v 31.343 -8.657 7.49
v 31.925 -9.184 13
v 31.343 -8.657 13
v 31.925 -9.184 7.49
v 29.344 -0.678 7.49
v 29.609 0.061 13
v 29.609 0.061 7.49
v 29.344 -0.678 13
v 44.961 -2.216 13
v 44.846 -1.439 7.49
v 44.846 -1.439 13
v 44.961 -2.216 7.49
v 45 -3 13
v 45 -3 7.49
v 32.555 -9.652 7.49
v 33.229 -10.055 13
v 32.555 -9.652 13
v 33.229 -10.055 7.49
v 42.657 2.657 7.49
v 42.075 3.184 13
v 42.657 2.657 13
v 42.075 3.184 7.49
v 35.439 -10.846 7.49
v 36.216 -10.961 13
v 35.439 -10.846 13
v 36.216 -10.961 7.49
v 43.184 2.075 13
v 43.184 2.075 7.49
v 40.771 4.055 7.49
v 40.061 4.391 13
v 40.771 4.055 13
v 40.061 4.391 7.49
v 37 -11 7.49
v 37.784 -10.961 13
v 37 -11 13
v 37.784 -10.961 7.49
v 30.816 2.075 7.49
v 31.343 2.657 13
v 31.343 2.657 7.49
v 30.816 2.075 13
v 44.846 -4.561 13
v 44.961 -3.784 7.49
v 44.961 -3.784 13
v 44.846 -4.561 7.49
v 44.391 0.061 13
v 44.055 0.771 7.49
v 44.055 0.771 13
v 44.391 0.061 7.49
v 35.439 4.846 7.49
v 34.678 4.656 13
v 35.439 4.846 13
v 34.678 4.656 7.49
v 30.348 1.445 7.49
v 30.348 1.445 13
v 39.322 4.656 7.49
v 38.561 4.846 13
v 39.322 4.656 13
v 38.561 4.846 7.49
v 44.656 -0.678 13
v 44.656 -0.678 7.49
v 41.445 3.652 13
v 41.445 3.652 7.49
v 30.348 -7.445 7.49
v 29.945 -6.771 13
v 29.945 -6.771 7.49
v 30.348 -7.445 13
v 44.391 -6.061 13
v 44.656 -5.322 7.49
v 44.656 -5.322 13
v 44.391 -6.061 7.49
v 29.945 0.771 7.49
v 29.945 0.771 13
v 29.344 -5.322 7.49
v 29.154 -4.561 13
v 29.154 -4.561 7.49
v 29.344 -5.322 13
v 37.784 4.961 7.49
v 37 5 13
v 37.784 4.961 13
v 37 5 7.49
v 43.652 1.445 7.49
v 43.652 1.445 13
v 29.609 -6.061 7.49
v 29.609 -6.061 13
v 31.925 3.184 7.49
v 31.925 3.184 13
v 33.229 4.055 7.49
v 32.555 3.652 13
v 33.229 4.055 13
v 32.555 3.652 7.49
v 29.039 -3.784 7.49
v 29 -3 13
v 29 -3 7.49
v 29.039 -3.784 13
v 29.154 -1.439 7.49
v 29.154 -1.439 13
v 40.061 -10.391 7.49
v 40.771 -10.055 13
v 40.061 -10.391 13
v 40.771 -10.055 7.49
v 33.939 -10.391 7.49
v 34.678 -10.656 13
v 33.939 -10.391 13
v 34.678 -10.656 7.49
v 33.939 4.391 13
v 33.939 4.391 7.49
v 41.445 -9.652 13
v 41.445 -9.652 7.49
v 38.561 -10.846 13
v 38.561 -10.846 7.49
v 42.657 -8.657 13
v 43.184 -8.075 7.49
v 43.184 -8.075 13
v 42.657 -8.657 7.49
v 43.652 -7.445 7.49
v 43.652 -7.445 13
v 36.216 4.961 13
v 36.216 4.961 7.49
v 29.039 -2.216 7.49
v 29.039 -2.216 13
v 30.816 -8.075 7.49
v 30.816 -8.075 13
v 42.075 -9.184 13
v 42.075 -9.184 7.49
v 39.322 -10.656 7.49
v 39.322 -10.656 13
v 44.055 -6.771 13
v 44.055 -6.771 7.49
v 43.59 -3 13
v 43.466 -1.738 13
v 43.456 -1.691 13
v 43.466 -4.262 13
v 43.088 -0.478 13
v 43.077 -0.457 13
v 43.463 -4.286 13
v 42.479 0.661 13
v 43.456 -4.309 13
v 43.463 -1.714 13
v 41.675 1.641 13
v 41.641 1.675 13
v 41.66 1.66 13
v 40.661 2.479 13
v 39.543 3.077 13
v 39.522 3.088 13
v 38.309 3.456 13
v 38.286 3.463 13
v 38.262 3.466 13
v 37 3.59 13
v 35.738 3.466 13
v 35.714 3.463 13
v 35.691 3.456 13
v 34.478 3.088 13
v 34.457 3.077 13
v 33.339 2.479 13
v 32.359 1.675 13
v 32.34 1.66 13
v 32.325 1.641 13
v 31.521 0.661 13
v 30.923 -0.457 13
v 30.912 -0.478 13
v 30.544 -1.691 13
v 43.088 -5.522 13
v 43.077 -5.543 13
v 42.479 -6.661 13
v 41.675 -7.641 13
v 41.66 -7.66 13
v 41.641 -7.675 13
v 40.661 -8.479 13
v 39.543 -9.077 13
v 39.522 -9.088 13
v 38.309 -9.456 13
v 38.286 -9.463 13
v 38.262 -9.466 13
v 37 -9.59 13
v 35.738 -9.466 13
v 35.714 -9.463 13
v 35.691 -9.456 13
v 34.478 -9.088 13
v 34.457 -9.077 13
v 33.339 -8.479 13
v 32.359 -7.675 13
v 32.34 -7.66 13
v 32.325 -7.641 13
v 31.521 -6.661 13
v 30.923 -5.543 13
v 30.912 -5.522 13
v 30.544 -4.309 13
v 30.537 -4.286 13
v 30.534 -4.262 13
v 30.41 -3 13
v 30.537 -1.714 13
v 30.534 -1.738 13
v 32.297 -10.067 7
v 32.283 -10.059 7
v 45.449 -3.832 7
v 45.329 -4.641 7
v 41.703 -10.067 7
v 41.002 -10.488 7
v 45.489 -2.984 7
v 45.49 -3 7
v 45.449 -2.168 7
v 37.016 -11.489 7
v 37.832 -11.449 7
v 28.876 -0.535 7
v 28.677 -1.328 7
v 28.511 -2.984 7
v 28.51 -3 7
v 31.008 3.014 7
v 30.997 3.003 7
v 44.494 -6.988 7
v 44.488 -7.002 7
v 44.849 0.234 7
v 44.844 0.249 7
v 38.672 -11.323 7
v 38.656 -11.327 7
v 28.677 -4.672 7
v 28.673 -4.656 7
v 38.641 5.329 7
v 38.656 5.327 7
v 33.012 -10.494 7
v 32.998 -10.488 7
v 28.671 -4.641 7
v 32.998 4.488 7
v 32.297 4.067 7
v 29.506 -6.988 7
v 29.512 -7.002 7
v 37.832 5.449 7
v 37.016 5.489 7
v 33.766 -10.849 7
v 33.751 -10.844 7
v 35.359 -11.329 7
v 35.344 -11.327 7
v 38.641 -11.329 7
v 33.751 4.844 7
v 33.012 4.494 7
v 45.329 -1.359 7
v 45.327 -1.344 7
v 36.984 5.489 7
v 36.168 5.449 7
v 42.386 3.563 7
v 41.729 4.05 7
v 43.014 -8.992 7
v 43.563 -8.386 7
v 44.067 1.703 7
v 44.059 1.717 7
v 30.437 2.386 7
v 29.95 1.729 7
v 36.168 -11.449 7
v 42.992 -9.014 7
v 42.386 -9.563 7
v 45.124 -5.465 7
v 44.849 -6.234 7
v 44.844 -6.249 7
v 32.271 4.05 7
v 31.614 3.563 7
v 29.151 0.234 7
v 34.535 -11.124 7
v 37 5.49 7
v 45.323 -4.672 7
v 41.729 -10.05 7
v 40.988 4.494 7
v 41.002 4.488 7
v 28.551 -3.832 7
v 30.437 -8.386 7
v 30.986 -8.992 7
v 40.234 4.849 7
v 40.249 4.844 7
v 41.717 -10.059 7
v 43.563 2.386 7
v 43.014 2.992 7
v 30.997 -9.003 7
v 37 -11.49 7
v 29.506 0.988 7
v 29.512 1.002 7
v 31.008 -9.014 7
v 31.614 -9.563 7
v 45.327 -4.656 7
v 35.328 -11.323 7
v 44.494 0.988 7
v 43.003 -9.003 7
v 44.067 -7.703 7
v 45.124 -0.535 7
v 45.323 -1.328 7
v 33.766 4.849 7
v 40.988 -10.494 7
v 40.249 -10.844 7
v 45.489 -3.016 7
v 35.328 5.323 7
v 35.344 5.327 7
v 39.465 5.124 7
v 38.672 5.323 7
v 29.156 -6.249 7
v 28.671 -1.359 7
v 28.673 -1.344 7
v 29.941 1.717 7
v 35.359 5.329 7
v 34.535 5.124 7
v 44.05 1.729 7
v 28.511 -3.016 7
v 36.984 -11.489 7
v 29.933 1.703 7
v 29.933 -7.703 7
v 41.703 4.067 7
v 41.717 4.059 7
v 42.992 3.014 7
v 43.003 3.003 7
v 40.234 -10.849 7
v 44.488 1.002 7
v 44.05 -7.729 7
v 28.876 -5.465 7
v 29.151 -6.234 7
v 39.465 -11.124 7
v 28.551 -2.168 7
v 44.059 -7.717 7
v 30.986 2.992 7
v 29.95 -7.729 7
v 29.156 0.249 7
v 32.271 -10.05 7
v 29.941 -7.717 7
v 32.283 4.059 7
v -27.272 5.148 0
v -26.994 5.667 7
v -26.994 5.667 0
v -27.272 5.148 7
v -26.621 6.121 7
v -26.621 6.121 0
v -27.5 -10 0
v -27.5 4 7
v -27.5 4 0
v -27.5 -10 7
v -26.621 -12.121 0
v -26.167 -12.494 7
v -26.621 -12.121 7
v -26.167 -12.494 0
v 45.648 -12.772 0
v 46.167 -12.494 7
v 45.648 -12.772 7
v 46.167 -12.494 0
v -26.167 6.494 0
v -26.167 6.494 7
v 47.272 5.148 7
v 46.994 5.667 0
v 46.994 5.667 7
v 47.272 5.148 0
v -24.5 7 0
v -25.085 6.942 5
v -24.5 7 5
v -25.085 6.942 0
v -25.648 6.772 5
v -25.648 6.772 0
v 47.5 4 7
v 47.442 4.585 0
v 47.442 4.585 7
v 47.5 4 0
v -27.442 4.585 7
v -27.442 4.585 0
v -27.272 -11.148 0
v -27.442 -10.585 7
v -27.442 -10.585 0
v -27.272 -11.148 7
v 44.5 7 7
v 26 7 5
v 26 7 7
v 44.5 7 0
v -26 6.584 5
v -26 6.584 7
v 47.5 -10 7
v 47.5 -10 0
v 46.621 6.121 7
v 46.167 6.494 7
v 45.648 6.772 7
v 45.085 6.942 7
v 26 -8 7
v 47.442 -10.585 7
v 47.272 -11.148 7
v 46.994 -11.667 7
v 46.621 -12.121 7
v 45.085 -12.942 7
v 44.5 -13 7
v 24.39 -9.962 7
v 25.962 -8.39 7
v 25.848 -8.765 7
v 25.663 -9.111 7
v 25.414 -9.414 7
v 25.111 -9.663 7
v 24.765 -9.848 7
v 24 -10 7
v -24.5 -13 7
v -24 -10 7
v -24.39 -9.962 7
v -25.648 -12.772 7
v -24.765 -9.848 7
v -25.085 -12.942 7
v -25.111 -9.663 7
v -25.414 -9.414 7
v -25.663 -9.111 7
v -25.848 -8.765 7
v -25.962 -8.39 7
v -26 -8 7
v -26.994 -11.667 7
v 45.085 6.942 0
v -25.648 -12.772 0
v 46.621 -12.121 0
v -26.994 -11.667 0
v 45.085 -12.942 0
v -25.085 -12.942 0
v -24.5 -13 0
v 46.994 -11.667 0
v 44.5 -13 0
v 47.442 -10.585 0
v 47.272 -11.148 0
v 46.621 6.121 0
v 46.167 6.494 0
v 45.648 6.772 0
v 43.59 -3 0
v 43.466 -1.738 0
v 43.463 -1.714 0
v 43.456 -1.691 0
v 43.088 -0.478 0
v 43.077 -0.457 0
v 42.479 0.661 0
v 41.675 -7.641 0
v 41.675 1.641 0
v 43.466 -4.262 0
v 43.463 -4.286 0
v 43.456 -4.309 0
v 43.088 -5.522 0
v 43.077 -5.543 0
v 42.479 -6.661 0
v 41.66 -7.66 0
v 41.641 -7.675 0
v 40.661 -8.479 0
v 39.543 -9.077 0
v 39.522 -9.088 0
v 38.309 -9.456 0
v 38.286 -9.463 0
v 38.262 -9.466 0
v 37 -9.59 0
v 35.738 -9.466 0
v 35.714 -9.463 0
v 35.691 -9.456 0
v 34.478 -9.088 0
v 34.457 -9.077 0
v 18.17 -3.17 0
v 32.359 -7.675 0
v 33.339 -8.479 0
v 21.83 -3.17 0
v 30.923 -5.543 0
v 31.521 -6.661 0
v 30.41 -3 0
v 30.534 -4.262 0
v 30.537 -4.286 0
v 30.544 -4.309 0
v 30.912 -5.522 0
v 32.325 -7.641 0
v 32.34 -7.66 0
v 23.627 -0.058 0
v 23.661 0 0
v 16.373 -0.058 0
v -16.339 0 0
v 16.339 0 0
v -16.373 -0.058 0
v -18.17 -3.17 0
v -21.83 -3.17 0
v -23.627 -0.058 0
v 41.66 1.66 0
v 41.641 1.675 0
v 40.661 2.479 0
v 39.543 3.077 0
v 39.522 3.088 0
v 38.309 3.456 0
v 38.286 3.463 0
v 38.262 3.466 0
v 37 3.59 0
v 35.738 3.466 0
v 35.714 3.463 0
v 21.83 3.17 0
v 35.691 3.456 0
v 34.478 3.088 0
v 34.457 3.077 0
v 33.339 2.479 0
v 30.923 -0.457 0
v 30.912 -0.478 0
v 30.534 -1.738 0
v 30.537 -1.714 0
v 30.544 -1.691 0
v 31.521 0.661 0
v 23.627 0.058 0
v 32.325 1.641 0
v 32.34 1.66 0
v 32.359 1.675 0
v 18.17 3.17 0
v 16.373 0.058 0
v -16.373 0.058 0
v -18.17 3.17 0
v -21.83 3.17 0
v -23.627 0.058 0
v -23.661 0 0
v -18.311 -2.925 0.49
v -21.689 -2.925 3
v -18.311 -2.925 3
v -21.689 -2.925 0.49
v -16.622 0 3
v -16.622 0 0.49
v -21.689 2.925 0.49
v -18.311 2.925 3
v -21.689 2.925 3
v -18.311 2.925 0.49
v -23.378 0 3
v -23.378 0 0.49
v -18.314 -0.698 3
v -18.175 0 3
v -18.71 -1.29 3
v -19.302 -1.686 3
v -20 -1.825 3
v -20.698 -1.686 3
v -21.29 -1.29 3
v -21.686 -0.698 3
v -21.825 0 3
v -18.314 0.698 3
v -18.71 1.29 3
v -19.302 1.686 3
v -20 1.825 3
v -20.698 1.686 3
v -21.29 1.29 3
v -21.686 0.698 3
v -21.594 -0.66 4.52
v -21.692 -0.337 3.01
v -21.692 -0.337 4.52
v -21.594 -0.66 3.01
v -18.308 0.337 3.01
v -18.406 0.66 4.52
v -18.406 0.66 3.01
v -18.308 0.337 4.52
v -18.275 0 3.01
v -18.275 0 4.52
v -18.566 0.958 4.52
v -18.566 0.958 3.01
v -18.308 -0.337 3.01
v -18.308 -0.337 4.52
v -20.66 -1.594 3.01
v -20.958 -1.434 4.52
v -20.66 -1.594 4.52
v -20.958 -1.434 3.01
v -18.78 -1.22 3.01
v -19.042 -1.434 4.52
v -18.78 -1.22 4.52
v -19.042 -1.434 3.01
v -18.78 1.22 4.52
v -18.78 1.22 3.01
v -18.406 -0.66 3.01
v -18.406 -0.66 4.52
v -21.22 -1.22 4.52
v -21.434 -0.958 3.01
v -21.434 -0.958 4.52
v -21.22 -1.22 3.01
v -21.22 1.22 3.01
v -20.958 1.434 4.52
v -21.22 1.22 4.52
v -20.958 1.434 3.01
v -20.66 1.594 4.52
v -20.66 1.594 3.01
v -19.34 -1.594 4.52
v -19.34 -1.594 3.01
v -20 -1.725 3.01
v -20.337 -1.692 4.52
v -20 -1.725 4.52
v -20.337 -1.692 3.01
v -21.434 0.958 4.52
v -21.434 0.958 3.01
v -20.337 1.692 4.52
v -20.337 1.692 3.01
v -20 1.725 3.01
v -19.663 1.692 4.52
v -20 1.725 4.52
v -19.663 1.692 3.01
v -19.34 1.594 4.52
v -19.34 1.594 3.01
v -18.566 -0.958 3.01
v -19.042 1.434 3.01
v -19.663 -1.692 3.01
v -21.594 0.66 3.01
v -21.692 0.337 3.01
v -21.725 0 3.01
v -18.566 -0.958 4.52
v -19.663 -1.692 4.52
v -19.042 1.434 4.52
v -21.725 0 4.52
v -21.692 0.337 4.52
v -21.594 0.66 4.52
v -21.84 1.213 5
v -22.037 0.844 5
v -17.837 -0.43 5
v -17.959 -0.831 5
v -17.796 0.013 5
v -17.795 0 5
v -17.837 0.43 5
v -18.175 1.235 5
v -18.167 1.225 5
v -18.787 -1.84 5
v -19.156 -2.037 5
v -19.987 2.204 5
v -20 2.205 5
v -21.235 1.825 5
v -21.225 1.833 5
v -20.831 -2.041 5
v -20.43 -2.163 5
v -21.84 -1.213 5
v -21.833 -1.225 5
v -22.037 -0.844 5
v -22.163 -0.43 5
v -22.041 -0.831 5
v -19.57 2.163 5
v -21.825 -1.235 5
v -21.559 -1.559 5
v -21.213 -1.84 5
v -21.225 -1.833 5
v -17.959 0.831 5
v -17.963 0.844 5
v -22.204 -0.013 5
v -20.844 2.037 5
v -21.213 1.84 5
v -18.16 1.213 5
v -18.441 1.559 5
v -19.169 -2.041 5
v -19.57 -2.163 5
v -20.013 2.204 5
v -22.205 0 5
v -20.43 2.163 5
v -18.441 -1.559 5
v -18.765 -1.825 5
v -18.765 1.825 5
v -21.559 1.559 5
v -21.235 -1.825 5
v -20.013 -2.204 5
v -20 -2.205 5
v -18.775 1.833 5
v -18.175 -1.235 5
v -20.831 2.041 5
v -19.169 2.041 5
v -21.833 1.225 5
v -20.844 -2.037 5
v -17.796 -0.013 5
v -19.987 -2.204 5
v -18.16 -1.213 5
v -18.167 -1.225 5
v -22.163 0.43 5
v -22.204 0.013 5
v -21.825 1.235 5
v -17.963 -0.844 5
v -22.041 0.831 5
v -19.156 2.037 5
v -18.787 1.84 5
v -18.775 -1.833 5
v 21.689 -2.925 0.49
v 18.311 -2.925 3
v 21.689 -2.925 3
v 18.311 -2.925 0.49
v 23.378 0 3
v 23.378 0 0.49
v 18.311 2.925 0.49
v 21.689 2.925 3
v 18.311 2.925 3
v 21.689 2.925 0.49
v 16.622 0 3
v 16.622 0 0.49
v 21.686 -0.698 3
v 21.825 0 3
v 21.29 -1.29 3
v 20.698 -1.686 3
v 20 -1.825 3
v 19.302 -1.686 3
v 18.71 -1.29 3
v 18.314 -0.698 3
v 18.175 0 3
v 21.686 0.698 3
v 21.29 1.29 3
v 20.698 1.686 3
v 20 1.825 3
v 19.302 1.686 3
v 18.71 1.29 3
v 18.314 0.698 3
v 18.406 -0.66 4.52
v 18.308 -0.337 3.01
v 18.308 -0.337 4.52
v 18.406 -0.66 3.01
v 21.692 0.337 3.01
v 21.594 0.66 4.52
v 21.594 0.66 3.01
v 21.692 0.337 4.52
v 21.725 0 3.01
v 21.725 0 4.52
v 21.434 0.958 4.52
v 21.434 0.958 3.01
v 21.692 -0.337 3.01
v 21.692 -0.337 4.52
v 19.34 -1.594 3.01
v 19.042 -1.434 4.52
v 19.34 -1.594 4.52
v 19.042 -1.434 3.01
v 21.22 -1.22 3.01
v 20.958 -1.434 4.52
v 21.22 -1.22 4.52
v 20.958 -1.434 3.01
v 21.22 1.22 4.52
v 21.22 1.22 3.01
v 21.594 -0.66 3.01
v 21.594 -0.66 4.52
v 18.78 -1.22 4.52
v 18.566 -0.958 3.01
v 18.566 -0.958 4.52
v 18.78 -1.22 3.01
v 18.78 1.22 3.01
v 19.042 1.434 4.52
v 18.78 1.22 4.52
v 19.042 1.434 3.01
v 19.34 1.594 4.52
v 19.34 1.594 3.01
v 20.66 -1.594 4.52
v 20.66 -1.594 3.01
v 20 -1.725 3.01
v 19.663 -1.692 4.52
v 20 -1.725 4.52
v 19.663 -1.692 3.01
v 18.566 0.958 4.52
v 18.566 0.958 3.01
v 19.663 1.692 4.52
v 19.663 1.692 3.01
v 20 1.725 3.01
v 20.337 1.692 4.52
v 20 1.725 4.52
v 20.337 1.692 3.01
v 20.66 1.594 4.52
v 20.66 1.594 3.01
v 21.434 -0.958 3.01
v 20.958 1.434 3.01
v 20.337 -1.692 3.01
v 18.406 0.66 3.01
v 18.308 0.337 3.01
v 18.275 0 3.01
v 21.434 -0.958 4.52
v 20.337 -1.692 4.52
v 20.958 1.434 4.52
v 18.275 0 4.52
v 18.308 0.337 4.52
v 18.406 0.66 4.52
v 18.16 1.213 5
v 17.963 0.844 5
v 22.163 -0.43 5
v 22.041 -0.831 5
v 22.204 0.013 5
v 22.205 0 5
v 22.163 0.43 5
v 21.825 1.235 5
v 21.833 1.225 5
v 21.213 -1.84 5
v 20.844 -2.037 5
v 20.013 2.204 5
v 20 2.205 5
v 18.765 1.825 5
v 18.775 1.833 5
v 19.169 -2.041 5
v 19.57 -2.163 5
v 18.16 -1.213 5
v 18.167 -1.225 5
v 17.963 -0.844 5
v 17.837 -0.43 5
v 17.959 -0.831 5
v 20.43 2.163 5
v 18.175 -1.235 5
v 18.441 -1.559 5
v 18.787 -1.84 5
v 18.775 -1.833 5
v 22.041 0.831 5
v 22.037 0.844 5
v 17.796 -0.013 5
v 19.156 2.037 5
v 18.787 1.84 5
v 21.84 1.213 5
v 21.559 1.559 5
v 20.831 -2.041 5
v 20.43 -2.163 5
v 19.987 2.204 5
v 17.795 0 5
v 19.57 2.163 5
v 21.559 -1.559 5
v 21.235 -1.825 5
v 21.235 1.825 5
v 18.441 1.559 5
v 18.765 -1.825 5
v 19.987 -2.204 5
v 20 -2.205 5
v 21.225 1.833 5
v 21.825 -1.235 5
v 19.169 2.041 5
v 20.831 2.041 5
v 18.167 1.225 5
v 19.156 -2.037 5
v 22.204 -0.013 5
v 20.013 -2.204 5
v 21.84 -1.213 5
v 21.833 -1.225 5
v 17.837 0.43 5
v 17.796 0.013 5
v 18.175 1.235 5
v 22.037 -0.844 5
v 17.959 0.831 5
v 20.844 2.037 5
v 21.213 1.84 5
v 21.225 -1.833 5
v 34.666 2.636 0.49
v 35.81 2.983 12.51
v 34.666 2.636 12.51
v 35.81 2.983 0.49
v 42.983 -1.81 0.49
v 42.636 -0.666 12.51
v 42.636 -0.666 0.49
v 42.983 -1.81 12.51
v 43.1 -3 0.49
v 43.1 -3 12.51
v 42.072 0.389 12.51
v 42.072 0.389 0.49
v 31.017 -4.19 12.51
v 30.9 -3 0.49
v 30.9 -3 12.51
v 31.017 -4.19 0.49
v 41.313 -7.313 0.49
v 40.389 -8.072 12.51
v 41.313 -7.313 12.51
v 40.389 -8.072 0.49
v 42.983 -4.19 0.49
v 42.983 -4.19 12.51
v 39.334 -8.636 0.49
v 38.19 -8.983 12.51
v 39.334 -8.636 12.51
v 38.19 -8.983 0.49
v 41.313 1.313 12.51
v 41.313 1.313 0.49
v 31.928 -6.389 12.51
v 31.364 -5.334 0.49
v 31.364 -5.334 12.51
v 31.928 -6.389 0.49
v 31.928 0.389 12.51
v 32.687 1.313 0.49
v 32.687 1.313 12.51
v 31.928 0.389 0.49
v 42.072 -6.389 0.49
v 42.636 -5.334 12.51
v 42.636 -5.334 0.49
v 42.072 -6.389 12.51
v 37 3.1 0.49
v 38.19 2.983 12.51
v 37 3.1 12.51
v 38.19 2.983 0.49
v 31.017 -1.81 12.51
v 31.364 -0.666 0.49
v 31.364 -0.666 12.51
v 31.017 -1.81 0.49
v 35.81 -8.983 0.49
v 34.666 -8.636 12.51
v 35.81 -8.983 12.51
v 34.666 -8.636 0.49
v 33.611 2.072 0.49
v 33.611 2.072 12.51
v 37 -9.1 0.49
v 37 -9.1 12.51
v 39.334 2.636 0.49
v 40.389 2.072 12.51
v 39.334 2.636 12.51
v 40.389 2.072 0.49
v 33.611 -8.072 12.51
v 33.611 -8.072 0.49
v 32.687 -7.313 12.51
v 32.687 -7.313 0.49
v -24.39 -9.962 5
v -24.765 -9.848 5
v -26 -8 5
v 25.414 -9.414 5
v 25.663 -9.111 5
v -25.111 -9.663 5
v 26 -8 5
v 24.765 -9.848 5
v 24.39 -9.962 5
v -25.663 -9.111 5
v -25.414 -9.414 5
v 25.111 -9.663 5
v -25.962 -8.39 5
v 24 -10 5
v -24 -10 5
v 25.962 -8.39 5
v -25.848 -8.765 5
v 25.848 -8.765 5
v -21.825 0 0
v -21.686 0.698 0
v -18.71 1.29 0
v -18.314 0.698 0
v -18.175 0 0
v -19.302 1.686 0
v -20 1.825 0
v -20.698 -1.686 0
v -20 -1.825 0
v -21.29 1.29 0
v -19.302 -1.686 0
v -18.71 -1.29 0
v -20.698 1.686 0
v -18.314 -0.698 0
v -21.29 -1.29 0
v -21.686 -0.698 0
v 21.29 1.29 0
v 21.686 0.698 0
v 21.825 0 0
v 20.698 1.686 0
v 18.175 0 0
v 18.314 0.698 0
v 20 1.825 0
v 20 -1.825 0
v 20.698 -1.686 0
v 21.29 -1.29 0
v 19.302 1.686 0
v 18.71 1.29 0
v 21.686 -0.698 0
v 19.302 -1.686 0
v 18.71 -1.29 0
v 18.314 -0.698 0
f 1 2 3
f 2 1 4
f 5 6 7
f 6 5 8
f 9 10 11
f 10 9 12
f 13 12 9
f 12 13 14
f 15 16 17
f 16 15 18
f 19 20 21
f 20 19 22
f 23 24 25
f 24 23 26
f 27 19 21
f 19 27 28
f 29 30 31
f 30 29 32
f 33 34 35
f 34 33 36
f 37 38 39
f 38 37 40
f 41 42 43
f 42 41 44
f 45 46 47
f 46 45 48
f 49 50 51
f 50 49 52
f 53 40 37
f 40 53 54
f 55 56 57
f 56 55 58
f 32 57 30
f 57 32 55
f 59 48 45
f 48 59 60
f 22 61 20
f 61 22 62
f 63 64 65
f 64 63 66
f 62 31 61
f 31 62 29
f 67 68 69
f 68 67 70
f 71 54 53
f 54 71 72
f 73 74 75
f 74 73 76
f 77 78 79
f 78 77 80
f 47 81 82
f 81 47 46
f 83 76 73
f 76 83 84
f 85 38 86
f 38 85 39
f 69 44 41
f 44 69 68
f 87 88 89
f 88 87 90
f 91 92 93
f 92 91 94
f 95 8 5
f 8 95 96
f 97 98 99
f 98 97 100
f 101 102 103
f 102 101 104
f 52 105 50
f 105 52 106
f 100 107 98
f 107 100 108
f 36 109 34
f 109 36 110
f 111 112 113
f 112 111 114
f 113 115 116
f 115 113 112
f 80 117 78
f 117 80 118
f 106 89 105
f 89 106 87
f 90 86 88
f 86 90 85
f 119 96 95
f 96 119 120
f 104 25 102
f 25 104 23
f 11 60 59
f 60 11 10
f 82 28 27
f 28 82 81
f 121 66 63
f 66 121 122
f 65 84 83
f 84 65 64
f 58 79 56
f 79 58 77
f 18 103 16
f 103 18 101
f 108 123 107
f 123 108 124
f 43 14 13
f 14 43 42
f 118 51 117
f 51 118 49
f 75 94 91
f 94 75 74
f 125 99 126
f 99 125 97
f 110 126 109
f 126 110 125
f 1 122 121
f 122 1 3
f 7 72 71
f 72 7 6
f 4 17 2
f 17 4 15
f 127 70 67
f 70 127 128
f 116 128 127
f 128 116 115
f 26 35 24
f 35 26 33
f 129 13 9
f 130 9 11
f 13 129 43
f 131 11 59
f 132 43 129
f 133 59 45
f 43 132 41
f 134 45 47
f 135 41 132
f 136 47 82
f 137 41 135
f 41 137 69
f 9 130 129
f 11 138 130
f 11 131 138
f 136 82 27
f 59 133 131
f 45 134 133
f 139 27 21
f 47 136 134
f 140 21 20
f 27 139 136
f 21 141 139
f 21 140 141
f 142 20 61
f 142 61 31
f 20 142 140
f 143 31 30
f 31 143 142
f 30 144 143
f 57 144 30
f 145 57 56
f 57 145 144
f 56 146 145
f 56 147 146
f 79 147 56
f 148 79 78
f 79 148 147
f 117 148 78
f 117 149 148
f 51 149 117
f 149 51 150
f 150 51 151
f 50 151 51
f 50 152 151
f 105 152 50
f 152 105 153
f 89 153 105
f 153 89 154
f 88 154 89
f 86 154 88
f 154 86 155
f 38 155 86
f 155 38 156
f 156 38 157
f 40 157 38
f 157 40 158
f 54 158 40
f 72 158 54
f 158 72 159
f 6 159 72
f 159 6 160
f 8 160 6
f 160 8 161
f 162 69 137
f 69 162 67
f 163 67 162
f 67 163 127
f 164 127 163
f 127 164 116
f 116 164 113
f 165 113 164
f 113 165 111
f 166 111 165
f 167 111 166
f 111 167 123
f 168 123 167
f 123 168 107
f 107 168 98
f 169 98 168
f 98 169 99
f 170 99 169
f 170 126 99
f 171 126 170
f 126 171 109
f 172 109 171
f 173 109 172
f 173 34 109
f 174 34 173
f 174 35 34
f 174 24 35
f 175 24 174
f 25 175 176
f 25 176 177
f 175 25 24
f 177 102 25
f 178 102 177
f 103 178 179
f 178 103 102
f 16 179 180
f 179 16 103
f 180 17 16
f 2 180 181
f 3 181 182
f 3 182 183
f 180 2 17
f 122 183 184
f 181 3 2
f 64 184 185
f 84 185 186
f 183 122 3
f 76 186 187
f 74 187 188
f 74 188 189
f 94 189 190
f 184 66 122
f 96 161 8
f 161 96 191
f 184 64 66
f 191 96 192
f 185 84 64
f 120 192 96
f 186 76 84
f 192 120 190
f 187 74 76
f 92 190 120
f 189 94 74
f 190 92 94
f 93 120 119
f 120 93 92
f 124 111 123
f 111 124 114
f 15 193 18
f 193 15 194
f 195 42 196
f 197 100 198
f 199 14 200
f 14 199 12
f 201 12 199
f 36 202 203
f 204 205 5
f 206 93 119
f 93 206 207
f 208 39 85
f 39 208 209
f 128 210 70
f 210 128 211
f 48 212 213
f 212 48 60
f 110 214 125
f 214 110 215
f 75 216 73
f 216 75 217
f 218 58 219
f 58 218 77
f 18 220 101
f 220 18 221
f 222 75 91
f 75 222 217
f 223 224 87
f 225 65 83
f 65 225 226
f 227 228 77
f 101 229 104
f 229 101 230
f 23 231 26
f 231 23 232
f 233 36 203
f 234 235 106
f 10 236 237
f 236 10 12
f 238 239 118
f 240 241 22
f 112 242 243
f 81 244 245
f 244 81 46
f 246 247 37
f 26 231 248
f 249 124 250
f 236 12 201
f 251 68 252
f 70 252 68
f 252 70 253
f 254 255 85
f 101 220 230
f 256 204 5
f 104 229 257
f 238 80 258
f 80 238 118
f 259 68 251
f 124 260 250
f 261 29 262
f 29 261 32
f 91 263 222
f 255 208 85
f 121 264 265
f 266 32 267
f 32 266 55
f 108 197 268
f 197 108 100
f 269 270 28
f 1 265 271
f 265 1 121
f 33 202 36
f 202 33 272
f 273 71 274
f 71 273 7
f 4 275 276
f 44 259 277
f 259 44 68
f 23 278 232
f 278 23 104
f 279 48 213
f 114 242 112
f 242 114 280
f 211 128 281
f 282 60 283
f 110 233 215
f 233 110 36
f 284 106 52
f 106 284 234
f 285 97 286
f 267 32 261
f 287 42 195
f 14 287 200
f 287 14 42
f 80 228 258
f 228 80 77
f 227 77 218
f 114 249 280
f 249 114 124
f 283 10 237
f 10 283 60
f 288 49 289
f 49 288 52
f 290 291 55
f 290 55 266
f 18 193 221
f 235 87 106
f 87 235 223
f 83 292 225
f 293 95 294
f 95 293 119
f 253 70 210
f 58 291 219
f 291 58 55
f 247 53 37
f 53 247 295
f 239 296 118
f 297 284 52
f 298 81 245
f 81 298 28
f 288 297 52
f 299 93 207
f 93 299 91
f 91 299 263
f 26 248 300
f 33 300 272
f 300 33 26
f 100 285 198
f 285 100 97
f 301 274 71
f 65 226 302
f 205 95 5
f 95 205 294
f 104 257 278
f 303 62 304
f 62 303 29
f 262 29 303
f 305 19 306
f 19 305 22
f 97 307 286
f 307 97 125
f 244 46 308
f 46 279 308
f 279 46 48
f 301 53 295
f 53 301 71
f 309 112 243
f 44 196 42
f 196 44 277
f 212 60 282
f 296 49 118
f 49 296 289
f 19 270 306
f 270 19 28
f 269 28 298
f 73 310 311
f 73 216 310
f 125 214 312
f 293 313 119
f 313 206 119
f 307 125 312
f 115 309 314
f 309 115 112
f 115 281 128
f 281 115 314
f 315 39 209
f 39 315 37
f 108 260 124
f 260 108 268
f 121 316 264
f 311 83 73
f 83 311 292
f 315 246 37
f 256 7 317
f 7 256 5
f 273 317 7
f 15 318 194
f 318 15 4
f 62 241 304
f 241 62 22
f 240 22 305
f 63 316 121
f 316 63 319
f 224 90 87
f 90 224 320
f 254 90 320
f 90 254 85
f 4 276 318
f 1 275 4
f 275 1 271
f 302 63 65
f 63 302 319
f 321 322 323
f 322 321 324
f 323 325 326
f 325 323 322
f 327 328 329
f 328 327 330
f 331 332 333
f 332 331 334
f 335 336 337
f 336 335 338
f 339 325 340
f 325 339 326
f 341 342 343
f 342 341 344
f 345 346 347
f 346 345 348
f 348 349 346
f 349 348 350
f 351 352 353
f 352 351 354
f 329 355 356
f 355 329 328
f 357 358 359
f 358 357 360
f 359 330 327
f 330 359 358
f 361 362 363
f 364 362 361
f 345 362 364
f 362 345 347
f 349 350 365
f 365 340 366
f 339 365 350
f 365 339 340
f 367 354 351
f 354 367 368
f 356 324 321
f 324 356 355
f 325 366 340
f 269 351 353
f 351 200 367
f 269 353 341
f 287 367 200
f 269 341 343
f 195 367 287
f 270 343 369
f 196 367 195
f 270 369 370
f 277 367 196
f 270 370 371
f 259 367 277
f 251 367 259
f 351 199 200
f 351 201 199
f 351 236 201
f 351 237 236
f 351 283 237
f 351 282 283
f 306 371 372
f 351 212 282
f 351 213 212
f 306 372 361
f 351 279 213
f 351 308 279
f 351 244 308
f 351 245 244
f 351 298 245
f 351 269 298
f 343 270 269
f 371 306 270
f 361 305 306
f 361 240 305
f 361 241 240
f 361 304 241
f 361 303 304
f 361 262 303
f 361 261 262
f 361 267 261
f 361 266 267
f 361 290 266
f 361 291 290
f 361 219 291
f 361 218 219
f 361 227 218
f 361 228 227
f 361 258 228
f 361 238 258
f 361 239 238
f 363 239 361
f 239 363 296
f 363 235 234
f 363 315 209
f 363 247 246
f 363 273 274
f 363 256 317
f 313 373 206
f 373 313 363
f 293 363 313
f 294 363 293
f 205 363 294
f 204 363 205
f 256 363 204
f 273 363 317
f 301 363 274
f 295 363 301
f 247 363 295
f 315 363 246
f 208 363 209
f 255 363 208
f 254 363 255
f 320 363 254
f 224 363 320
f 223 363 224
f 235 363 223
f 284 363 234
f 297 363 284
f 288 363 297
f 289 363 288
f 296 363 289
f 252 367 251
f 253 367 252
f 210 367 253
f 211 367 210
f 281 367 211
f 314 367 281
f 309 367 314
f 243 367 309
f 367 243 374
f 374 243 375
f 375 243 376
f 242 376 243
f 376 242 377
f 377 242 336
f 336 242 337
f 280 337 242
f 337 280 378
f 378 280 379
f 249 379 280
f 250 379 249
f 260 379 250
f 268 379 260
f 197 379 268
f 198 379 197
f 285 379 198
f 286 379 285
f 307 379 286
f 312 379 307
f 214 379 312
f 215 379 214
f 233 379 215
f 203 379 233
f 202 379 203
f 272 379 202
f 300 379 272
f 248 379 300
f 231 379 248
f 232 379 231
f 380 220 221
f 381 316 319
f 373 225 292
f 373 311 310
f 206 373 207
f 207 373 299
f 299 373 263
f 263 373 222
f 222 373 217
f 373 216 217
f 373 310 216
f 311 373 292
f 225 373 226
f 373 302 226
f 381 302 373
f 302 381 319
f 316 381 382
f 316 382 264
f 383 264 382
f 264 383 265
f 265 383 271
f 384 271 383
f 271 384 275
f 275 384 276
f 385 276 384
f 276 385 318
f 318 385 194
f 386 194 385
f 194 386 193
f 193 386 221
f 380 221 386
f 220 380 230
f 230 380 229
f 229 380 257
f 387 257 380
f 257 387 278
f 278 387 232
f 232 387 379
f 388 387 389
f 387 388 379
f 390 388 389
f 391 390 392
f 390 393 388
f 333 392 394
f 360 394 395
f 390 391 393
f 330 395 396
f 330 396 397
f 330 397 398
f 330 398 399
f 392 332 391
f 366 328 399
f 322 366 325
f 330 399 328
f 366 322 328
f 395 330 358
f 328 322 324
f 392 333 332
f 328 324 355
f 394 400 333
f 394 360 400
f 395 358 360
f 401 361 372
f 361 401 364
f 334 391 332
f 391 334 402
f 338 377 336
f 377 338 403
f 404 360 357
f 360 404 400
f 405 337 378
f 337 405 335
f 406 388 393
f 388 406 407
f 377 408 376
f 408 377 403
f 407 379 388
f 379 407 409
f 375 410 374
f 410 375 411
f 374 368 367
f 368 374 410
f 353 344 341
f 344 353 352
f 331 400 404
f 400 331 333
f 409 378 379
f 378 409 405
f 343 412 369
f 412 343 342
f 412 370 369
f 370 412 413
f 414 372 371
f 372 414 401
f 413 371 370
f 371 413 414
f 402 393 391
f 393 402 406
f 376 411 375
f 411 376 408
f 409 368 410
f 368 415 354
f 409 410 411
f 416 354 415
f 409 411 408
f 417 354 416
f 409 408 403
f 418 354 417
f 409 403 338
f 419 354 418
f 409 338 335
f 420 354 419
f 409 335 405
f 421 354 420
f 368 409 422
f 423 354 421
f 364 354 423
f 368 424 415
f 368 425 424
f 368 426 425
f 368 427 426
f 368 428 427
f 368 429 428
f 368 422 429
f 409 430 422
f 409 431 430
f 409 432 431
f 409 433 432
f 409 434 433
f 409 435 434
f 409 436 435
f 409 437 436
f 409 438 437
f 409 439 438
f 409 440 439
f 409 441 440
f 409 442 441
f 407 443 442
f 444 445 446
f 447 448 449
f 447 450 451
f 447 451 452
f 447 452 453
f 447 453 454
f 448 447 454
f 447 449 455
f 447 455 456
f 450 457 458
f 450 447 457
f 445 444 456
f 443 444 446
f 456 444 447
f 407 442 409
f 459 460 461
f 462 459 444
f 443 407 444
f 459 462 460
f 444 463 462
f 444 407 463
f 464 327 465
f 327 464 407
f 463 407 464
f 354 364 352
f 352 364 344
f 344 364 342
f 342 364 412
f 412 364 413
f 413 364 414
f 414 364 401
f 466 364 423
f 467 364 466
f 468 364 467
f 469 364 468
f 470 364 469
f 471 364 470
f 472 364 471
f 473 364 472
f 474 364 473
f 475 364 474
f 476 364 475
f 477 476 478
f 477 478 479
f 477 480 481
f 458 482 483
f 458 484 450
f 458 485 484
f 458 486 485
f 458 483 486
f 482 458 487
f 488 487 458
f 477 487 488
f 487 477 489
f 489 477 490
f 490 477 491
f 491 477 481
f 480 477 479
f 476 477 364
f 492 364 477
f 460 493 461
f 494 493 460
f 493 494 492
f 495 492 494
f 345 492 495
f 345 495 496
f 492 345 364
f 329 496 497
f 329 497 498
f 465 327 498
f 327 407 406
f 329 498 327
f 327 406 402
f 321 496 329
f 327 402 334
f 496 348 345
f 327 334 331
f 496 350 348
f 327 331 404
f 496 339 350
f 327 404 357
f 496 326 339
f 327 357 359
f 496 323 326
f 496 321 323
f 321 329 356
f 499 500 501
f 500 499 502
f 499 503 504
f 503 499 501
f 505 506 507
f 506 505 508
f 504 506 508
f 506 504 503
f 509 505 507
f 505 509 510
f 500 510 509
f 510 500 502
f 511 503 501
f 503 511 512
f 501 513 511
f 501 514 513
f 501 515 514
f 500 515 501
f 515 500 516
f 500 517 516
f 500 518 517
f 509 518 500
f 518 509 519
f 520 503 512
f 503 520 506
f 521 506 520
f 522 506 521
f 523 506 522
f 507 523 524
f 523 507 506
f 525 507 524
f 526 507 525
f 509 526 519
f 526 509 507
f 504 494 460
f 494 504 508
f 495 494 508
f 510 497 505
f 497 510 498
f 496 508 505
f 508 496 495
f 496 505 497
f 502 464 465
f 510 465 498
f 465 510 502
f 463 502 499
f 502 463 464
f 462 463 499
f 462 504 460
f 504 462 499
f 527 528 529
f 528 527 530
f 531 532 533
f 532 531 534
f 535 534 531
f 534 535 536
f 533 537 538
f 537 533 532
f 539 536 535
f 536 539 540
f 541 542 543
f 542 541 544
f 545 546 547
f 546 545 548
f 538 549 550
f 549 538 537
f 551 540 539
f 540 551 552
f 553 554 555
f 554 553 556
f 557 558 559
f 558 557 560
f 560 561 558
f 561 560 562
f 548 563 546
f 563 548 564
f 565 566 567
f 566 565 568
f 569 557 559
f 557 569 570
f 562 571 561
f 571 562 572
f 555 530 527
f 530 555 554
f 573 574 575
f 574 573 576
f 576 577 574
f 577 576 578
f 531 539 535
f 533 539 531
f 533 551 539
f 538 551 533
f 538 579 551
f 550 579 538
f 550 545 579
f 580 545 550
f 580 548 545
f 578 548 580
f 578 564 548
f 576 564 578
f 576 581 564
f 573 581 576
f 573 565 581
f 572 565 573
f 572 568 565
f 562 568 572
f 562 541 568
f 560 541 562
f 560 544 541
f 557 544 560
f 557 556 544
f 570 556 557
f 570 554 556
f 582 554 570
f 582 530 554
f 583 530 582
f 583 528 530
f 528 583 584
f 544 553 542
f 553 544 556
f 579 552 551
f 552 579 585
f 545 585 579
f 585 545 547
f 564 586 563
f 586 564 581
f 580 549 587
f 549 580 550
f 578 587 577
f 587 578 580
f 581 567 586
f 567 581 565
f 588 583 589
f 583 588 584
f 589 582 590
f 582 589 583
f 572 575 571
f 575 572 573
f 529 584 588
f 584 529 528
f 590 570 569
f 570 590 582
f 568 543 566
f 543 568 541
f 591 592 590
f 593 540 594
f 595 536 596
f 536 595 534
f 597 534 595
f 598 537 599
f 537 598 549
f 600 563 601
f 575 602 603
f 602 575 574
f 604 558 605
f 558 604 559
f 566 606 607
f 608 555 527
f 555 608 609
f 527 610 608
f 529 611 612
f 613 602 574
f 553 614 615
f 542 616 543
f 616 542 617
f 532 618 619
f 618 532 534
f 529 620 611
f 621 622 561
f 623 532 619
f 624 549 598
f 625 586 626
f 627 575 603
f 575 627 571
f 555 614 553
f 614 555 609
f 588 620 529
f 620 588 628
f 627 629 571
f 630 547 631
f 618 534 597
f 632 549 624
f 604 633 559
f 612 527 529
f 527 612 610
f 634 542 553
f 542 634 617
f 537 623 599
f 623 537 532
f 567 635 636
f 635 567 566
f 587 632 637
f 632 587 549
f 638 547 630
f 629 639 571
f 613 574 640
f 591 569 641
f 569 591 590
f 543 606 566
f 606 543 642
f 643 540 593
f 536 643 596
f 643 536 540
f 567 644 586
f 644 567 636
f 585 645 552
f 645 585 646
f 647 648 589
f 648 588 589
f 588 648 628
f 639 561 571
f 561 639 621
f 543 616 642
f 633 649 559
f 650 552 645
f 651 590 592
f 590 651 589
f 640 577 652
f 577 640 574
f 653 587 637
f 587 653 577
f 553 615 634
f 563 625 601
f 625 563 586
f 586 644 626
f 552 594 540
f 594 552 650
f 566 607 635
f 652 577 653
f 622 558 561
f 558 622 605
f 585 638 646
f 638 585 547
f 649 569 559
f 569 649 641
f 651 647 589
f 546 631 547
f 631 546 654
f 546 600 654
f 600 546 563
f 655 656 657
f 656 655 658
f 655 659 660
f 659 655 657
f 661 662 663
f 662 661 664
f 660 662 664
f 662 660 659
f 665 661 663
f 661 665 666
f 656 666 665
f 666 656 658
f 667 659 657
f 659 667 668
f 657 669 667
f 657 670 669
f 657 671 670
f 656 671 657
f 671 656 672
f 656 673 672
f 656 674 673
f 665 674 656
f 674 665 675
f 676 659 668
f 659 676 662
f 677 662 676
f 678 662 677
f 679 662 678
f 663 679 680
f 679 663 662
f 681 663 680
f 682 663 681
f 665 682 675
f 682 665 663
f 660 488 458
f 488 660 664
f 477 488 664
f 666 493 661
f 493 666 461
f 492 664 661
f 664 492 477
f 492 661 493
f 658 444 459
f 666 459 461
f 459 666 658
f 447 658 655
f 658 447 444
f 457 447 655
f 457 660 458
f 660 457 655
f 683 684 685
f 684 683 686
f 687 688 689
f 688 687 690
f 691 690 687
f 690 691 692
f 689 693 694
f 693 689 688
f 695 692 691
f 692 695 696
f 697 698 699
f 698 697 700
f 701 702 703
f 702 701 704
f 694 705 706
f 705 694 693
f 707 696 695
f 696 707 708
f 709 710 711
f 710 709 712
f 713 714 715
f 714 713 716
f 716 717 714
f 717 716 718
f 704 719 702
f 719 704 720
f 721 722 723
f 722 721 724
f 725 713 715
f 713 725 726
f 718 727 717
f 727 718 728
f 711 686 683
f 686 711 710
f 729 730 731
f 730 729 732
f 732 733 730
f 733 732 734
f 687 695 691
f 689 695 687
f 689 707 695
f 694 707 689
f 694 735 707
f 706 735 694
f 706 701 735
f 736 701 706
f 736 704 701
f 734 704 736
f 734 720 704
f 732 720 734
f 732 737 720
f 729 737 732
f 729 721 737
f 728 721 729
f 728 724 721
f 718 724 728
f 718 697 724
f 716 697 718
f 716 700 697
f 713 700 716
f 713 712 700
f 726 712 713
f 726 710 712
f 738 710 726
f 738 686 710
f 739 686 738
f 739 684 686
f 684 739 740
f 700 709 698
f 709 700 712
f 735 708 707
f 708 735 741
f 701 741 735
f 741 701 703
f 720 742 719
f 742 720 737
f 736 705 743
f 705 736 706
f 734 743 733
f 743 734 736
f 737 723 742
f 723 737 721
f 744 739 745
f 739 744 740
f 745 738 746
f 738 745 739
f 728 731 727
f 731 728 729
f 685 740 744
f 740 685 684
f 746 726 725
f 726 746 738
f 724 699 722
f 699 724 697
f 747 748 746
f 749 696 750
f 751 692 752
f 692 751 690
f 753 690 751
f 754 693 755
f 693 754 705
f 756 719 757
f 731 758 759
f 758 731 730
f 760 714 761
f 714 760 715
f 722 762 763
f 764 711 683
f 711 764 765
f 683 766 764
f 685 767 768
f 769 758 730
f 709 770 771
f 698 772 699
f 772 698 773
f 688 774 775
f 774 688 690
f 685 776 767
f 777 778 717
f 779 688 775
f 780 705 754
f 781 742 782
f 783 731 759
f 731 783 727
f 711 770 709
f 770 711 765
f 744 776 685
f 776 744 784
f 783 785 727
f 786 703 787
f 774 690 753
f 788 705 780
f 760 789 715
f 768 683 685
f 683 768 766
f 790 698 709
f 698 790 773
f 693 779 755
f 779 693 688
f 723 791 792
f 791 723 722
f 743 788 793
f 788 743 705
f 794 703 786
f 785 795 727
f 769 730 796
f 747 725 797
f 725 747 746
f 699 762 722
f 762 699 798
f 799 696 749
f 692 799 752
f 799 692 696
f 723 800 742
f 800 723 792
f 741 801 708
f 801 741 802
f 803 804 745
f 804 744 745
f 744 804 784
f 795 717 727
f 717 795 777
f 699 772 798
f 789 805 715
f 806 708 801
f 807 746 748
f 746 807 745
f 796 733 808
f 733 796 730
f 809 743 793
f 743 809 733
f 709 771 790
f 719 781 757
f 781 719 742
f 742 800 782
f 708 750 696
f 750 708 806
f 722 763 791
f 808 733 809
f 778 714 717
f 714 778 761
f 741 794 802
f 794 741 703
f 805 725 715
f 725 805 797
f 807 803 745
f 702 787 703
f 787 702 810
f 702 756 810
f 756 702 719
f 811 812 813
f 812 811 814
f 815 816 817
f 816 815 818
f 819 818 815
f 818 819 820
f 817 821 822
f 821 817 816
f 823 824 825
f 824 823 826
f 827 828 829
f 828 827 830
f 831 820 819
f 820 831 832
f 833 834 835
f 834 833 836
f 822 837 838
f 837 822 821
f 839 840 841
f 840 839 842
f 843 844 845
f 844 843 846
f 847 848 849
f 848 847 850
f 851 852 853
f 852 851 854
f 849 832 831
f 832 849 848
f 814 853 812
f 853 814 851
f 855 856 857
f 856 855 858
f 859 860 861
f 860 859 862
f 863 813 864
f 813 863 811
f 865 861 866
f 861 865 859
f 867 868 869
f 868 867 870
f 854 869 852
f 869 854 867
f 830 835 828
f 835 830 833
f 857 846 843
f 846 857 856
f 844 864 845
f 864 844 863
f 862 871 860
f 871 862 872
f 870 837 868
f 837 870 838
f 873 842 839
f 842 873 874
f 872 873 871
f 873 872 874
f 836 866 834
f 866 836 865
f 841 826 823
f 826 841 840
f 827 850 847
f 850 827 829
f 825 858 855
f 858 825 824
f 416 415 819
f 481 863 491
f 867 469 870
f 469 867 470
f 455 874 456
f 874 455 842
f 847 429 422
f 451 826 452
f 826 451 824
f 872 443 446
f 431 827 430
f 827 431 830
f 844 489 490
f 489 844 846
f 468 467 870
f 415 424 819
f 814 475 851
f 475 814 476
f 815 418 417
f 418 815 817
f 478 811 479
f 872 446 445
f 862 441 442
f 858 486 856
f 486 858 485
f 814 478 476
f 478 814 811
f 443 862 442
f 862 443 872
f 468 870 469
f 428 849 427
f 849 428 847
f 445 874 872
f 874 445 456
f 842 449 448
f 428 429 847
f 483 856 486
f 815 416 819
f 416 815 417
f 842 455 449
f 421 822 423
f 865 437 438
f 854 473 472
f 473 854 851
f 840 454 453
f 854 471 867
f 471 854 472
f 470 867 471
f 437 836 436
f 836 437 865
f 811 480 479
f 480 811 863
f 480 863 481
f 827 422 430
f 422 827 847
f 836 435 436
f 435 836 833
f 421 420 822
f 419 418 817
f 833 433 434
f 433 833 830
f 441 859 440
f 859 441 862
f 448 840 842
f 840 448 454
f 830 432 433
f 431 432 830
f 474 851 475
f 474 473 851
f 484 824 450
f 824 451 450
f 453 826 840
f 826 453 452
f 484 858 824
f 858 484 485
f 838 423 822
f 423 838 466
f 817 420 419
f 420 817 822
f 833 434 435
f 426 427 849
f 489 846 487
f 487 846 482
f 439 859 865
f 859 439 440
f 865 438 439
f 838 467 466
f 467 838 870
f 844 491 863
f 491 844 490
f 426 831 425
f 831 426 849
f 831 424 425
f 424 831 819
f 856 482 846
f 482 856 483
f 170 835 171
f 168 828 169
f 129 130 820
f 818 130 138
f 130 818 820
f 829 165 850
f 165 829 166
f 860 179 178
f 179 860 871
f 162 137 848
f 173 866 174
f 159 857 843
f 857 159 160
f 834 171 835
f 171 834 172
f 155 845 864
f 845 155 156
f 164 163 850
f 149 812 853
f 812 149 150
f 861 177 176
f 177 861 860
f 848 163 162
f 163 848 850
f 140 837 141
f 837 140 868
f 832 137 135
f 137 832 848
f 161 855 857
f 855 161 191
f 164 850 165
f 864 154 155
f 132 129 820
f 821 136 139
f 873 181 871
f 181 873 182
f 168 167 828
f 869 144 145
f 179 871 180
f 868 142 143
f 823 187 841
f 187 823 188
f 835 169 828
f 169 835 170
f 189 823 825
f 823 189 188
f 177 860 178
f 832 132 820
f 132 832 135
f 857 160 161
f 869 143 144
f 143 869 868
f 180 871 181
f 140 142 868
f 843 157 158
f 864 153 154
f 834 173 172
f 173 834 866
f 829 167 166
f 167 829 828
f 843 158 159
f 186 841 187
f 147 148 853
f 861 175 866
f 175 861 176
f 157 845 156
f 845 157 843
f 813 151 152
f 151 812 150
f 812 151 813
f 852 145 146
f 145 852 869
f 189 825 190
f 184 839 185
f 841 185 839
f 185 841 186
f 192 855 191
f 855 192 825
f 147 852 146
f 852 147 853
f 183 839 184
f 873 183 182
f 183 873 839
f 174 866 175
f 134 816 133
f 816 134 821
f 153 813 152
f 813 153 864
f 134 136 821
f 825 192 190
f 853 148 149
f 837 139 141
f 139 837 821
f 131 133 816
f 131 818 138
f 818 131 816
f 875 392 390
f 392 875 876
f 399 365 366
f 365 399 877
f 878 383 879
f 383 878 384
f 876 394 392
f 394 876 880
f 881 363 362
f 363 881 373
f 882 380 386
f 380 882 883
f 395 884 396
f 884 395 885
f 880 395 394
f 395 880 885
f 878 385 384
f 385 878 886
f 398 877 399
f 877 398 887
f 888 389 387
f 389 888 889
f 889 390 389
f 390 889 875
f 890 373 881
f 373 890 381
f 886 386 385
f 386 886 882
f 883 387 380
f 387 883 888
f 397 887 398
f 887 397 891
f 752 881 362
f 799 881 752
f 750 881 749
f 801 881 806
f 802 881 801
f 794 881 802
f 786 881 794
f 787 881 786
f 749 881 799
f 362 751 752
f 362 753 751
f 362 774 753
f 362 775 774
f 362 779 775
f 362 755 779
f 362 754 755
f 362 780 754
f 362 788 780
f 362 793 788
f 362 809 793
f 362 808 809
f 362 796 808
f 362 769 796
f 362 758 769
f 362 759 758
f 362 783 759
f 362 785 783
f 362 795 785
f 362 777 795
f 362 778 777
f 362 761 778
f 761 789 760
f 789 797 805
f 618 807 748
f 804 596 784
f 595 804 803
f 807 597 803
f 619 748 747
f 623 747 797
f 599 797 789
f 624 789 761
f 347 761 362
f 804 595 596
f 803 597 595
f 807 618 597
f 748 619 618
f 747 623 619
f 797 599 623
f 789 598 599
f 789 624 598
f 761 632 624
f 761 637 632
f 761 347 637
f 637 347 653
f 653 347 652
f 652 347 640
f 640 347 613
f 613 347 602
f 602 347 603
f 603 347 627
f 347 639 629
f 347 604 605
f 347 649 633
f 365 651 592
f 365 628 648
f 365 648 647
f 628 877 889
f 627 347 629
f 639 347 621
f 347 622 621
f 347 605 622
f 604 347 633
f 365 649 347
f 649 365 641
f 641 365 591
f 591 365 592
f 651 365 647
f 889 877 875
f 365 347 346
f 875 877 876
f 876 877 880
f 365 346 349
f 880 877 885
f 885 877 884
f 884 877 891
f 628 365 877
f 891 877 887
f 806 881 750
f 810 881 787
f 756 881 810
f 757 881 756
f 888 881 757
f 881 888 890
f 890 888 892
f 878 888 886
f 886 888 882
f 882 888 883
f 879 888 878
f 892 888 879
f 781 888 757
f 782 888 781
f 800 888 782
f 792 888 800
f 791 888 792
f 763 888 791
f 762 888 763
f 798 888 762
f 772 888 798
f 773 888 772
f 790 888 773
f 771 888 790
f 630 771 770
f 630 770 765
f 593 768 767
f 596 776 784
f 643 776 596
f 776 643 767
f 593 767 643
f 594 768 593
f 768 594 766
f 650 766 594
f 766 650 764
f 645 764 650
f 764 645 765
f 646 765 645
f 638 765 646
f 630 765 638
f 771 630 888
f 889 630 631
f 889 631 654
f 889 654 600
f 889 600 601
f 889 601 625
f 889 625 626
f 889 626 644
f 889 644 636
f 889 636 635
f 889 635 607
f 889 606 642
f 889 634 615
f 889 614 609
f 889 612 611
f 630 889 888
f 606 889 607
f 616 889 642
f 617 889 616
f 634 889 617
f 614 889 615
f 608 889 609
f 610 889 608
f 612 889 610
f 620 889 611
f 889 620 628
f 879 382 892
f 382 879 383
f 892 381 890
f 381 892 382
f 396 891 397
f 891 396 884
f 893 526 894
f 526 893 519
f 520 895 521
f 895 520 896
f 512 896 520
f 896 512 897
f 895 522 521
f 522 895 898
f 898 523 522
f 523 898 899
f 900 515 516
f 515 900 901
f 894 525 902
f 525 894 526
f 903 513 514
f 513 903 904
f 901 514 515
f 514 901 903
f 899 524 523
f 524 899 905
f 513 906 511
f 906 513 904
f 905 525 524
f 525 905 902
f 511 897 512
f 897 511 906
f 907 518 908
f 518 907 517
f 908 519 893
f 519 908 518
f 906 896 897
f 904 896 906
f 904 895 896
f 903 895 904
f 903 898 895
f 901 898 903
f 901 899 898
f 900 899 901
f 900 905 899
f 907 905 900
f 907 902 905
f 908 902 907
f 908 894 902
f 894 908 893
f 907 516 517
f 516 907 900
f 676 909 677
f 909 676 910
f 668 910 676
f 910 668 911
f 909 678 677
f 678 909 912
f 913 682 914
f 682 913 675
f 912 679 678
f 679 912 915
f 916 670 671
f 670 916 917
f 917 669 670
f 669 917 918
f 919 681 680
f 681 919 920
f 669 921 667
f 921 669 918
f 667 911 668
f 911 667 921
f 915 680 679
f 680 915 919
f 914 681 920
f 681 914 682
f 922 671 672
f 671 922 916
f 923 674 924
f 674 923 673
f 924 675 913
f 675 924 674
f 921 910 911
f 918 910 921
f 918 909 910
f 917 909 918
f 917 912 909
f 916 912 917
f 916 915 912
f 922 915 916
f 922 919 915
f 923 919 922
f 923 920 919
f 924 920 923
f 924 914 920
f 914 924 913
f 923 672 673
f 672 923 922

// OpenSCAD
// enlarged to account for shrink
g3mm = 3.45;
g3mmnut = 5.85;
g2mm = 2.0;
gNutChamfer = 0.5;

module NutTrap(x,h=100) {
    cylinder(d=x/0.866,h=h,$fn=6);
    translate([0,0,-0.01])
        cylinder(d1=(x+gNutChamfer)/0.866,d2=x/0.866,h=gNutChamfer,$fn=6);
}

module NutTrapSupport(d,h,cylinder_wall_offset=0.1) {
    cylinder(d=d+cylinder_wall_offset*2,h=h,$fn=16);
}

module RoundedCube(dims,r=10) {
    hull()
        for(x_scale=[1,-1])
        for(y_scale=[1,-1])
        scale([x_scale,y_scale,1])
        translate([dims[0]/2-r,dims[1]/2-r,0])
        cylinder(r=r,h=dims[2]);
}

module ChamferHole(r,h=100,c=0.5,top_c=0) {
    cylinder(r=r,h=h);
    translate([0,0,-0.01])
        cylinder(r1=r+c,r2=r,h=c);
    if(top_c != 0 )
        translate([0,0,h-c+0.01])
        cylinder(r1=r,r2=r+c,h=top_c);
}


module Main() {
    difference() {
        union() {
            translate([10,-3,0]) RoundedCube([75,20,7],3,$fn=32);
            translate([37,-3,7]) ChamferHole(8,6,$fn=64);
        }
        translate([0,0,5]) RoundedCube([52,20,7],2,$fn=32);
        for(x=[-20,20])
            translate([x,0,0]) {
                NutTrap(g3mmnut, 3);
                translate([0,0,5.01]) scale([1,1,-1]) ChamferHole(g3mm/2,2,$fn=32);
            }
        translate([37,-3,0]) ChamferHole(6.1,7+6,top_c=0.5,$fn=32);
    }
    for(x=[-20,20])
        translate([x,0,0]) NutTrapSupport(g3mm,3);
}

Main();
